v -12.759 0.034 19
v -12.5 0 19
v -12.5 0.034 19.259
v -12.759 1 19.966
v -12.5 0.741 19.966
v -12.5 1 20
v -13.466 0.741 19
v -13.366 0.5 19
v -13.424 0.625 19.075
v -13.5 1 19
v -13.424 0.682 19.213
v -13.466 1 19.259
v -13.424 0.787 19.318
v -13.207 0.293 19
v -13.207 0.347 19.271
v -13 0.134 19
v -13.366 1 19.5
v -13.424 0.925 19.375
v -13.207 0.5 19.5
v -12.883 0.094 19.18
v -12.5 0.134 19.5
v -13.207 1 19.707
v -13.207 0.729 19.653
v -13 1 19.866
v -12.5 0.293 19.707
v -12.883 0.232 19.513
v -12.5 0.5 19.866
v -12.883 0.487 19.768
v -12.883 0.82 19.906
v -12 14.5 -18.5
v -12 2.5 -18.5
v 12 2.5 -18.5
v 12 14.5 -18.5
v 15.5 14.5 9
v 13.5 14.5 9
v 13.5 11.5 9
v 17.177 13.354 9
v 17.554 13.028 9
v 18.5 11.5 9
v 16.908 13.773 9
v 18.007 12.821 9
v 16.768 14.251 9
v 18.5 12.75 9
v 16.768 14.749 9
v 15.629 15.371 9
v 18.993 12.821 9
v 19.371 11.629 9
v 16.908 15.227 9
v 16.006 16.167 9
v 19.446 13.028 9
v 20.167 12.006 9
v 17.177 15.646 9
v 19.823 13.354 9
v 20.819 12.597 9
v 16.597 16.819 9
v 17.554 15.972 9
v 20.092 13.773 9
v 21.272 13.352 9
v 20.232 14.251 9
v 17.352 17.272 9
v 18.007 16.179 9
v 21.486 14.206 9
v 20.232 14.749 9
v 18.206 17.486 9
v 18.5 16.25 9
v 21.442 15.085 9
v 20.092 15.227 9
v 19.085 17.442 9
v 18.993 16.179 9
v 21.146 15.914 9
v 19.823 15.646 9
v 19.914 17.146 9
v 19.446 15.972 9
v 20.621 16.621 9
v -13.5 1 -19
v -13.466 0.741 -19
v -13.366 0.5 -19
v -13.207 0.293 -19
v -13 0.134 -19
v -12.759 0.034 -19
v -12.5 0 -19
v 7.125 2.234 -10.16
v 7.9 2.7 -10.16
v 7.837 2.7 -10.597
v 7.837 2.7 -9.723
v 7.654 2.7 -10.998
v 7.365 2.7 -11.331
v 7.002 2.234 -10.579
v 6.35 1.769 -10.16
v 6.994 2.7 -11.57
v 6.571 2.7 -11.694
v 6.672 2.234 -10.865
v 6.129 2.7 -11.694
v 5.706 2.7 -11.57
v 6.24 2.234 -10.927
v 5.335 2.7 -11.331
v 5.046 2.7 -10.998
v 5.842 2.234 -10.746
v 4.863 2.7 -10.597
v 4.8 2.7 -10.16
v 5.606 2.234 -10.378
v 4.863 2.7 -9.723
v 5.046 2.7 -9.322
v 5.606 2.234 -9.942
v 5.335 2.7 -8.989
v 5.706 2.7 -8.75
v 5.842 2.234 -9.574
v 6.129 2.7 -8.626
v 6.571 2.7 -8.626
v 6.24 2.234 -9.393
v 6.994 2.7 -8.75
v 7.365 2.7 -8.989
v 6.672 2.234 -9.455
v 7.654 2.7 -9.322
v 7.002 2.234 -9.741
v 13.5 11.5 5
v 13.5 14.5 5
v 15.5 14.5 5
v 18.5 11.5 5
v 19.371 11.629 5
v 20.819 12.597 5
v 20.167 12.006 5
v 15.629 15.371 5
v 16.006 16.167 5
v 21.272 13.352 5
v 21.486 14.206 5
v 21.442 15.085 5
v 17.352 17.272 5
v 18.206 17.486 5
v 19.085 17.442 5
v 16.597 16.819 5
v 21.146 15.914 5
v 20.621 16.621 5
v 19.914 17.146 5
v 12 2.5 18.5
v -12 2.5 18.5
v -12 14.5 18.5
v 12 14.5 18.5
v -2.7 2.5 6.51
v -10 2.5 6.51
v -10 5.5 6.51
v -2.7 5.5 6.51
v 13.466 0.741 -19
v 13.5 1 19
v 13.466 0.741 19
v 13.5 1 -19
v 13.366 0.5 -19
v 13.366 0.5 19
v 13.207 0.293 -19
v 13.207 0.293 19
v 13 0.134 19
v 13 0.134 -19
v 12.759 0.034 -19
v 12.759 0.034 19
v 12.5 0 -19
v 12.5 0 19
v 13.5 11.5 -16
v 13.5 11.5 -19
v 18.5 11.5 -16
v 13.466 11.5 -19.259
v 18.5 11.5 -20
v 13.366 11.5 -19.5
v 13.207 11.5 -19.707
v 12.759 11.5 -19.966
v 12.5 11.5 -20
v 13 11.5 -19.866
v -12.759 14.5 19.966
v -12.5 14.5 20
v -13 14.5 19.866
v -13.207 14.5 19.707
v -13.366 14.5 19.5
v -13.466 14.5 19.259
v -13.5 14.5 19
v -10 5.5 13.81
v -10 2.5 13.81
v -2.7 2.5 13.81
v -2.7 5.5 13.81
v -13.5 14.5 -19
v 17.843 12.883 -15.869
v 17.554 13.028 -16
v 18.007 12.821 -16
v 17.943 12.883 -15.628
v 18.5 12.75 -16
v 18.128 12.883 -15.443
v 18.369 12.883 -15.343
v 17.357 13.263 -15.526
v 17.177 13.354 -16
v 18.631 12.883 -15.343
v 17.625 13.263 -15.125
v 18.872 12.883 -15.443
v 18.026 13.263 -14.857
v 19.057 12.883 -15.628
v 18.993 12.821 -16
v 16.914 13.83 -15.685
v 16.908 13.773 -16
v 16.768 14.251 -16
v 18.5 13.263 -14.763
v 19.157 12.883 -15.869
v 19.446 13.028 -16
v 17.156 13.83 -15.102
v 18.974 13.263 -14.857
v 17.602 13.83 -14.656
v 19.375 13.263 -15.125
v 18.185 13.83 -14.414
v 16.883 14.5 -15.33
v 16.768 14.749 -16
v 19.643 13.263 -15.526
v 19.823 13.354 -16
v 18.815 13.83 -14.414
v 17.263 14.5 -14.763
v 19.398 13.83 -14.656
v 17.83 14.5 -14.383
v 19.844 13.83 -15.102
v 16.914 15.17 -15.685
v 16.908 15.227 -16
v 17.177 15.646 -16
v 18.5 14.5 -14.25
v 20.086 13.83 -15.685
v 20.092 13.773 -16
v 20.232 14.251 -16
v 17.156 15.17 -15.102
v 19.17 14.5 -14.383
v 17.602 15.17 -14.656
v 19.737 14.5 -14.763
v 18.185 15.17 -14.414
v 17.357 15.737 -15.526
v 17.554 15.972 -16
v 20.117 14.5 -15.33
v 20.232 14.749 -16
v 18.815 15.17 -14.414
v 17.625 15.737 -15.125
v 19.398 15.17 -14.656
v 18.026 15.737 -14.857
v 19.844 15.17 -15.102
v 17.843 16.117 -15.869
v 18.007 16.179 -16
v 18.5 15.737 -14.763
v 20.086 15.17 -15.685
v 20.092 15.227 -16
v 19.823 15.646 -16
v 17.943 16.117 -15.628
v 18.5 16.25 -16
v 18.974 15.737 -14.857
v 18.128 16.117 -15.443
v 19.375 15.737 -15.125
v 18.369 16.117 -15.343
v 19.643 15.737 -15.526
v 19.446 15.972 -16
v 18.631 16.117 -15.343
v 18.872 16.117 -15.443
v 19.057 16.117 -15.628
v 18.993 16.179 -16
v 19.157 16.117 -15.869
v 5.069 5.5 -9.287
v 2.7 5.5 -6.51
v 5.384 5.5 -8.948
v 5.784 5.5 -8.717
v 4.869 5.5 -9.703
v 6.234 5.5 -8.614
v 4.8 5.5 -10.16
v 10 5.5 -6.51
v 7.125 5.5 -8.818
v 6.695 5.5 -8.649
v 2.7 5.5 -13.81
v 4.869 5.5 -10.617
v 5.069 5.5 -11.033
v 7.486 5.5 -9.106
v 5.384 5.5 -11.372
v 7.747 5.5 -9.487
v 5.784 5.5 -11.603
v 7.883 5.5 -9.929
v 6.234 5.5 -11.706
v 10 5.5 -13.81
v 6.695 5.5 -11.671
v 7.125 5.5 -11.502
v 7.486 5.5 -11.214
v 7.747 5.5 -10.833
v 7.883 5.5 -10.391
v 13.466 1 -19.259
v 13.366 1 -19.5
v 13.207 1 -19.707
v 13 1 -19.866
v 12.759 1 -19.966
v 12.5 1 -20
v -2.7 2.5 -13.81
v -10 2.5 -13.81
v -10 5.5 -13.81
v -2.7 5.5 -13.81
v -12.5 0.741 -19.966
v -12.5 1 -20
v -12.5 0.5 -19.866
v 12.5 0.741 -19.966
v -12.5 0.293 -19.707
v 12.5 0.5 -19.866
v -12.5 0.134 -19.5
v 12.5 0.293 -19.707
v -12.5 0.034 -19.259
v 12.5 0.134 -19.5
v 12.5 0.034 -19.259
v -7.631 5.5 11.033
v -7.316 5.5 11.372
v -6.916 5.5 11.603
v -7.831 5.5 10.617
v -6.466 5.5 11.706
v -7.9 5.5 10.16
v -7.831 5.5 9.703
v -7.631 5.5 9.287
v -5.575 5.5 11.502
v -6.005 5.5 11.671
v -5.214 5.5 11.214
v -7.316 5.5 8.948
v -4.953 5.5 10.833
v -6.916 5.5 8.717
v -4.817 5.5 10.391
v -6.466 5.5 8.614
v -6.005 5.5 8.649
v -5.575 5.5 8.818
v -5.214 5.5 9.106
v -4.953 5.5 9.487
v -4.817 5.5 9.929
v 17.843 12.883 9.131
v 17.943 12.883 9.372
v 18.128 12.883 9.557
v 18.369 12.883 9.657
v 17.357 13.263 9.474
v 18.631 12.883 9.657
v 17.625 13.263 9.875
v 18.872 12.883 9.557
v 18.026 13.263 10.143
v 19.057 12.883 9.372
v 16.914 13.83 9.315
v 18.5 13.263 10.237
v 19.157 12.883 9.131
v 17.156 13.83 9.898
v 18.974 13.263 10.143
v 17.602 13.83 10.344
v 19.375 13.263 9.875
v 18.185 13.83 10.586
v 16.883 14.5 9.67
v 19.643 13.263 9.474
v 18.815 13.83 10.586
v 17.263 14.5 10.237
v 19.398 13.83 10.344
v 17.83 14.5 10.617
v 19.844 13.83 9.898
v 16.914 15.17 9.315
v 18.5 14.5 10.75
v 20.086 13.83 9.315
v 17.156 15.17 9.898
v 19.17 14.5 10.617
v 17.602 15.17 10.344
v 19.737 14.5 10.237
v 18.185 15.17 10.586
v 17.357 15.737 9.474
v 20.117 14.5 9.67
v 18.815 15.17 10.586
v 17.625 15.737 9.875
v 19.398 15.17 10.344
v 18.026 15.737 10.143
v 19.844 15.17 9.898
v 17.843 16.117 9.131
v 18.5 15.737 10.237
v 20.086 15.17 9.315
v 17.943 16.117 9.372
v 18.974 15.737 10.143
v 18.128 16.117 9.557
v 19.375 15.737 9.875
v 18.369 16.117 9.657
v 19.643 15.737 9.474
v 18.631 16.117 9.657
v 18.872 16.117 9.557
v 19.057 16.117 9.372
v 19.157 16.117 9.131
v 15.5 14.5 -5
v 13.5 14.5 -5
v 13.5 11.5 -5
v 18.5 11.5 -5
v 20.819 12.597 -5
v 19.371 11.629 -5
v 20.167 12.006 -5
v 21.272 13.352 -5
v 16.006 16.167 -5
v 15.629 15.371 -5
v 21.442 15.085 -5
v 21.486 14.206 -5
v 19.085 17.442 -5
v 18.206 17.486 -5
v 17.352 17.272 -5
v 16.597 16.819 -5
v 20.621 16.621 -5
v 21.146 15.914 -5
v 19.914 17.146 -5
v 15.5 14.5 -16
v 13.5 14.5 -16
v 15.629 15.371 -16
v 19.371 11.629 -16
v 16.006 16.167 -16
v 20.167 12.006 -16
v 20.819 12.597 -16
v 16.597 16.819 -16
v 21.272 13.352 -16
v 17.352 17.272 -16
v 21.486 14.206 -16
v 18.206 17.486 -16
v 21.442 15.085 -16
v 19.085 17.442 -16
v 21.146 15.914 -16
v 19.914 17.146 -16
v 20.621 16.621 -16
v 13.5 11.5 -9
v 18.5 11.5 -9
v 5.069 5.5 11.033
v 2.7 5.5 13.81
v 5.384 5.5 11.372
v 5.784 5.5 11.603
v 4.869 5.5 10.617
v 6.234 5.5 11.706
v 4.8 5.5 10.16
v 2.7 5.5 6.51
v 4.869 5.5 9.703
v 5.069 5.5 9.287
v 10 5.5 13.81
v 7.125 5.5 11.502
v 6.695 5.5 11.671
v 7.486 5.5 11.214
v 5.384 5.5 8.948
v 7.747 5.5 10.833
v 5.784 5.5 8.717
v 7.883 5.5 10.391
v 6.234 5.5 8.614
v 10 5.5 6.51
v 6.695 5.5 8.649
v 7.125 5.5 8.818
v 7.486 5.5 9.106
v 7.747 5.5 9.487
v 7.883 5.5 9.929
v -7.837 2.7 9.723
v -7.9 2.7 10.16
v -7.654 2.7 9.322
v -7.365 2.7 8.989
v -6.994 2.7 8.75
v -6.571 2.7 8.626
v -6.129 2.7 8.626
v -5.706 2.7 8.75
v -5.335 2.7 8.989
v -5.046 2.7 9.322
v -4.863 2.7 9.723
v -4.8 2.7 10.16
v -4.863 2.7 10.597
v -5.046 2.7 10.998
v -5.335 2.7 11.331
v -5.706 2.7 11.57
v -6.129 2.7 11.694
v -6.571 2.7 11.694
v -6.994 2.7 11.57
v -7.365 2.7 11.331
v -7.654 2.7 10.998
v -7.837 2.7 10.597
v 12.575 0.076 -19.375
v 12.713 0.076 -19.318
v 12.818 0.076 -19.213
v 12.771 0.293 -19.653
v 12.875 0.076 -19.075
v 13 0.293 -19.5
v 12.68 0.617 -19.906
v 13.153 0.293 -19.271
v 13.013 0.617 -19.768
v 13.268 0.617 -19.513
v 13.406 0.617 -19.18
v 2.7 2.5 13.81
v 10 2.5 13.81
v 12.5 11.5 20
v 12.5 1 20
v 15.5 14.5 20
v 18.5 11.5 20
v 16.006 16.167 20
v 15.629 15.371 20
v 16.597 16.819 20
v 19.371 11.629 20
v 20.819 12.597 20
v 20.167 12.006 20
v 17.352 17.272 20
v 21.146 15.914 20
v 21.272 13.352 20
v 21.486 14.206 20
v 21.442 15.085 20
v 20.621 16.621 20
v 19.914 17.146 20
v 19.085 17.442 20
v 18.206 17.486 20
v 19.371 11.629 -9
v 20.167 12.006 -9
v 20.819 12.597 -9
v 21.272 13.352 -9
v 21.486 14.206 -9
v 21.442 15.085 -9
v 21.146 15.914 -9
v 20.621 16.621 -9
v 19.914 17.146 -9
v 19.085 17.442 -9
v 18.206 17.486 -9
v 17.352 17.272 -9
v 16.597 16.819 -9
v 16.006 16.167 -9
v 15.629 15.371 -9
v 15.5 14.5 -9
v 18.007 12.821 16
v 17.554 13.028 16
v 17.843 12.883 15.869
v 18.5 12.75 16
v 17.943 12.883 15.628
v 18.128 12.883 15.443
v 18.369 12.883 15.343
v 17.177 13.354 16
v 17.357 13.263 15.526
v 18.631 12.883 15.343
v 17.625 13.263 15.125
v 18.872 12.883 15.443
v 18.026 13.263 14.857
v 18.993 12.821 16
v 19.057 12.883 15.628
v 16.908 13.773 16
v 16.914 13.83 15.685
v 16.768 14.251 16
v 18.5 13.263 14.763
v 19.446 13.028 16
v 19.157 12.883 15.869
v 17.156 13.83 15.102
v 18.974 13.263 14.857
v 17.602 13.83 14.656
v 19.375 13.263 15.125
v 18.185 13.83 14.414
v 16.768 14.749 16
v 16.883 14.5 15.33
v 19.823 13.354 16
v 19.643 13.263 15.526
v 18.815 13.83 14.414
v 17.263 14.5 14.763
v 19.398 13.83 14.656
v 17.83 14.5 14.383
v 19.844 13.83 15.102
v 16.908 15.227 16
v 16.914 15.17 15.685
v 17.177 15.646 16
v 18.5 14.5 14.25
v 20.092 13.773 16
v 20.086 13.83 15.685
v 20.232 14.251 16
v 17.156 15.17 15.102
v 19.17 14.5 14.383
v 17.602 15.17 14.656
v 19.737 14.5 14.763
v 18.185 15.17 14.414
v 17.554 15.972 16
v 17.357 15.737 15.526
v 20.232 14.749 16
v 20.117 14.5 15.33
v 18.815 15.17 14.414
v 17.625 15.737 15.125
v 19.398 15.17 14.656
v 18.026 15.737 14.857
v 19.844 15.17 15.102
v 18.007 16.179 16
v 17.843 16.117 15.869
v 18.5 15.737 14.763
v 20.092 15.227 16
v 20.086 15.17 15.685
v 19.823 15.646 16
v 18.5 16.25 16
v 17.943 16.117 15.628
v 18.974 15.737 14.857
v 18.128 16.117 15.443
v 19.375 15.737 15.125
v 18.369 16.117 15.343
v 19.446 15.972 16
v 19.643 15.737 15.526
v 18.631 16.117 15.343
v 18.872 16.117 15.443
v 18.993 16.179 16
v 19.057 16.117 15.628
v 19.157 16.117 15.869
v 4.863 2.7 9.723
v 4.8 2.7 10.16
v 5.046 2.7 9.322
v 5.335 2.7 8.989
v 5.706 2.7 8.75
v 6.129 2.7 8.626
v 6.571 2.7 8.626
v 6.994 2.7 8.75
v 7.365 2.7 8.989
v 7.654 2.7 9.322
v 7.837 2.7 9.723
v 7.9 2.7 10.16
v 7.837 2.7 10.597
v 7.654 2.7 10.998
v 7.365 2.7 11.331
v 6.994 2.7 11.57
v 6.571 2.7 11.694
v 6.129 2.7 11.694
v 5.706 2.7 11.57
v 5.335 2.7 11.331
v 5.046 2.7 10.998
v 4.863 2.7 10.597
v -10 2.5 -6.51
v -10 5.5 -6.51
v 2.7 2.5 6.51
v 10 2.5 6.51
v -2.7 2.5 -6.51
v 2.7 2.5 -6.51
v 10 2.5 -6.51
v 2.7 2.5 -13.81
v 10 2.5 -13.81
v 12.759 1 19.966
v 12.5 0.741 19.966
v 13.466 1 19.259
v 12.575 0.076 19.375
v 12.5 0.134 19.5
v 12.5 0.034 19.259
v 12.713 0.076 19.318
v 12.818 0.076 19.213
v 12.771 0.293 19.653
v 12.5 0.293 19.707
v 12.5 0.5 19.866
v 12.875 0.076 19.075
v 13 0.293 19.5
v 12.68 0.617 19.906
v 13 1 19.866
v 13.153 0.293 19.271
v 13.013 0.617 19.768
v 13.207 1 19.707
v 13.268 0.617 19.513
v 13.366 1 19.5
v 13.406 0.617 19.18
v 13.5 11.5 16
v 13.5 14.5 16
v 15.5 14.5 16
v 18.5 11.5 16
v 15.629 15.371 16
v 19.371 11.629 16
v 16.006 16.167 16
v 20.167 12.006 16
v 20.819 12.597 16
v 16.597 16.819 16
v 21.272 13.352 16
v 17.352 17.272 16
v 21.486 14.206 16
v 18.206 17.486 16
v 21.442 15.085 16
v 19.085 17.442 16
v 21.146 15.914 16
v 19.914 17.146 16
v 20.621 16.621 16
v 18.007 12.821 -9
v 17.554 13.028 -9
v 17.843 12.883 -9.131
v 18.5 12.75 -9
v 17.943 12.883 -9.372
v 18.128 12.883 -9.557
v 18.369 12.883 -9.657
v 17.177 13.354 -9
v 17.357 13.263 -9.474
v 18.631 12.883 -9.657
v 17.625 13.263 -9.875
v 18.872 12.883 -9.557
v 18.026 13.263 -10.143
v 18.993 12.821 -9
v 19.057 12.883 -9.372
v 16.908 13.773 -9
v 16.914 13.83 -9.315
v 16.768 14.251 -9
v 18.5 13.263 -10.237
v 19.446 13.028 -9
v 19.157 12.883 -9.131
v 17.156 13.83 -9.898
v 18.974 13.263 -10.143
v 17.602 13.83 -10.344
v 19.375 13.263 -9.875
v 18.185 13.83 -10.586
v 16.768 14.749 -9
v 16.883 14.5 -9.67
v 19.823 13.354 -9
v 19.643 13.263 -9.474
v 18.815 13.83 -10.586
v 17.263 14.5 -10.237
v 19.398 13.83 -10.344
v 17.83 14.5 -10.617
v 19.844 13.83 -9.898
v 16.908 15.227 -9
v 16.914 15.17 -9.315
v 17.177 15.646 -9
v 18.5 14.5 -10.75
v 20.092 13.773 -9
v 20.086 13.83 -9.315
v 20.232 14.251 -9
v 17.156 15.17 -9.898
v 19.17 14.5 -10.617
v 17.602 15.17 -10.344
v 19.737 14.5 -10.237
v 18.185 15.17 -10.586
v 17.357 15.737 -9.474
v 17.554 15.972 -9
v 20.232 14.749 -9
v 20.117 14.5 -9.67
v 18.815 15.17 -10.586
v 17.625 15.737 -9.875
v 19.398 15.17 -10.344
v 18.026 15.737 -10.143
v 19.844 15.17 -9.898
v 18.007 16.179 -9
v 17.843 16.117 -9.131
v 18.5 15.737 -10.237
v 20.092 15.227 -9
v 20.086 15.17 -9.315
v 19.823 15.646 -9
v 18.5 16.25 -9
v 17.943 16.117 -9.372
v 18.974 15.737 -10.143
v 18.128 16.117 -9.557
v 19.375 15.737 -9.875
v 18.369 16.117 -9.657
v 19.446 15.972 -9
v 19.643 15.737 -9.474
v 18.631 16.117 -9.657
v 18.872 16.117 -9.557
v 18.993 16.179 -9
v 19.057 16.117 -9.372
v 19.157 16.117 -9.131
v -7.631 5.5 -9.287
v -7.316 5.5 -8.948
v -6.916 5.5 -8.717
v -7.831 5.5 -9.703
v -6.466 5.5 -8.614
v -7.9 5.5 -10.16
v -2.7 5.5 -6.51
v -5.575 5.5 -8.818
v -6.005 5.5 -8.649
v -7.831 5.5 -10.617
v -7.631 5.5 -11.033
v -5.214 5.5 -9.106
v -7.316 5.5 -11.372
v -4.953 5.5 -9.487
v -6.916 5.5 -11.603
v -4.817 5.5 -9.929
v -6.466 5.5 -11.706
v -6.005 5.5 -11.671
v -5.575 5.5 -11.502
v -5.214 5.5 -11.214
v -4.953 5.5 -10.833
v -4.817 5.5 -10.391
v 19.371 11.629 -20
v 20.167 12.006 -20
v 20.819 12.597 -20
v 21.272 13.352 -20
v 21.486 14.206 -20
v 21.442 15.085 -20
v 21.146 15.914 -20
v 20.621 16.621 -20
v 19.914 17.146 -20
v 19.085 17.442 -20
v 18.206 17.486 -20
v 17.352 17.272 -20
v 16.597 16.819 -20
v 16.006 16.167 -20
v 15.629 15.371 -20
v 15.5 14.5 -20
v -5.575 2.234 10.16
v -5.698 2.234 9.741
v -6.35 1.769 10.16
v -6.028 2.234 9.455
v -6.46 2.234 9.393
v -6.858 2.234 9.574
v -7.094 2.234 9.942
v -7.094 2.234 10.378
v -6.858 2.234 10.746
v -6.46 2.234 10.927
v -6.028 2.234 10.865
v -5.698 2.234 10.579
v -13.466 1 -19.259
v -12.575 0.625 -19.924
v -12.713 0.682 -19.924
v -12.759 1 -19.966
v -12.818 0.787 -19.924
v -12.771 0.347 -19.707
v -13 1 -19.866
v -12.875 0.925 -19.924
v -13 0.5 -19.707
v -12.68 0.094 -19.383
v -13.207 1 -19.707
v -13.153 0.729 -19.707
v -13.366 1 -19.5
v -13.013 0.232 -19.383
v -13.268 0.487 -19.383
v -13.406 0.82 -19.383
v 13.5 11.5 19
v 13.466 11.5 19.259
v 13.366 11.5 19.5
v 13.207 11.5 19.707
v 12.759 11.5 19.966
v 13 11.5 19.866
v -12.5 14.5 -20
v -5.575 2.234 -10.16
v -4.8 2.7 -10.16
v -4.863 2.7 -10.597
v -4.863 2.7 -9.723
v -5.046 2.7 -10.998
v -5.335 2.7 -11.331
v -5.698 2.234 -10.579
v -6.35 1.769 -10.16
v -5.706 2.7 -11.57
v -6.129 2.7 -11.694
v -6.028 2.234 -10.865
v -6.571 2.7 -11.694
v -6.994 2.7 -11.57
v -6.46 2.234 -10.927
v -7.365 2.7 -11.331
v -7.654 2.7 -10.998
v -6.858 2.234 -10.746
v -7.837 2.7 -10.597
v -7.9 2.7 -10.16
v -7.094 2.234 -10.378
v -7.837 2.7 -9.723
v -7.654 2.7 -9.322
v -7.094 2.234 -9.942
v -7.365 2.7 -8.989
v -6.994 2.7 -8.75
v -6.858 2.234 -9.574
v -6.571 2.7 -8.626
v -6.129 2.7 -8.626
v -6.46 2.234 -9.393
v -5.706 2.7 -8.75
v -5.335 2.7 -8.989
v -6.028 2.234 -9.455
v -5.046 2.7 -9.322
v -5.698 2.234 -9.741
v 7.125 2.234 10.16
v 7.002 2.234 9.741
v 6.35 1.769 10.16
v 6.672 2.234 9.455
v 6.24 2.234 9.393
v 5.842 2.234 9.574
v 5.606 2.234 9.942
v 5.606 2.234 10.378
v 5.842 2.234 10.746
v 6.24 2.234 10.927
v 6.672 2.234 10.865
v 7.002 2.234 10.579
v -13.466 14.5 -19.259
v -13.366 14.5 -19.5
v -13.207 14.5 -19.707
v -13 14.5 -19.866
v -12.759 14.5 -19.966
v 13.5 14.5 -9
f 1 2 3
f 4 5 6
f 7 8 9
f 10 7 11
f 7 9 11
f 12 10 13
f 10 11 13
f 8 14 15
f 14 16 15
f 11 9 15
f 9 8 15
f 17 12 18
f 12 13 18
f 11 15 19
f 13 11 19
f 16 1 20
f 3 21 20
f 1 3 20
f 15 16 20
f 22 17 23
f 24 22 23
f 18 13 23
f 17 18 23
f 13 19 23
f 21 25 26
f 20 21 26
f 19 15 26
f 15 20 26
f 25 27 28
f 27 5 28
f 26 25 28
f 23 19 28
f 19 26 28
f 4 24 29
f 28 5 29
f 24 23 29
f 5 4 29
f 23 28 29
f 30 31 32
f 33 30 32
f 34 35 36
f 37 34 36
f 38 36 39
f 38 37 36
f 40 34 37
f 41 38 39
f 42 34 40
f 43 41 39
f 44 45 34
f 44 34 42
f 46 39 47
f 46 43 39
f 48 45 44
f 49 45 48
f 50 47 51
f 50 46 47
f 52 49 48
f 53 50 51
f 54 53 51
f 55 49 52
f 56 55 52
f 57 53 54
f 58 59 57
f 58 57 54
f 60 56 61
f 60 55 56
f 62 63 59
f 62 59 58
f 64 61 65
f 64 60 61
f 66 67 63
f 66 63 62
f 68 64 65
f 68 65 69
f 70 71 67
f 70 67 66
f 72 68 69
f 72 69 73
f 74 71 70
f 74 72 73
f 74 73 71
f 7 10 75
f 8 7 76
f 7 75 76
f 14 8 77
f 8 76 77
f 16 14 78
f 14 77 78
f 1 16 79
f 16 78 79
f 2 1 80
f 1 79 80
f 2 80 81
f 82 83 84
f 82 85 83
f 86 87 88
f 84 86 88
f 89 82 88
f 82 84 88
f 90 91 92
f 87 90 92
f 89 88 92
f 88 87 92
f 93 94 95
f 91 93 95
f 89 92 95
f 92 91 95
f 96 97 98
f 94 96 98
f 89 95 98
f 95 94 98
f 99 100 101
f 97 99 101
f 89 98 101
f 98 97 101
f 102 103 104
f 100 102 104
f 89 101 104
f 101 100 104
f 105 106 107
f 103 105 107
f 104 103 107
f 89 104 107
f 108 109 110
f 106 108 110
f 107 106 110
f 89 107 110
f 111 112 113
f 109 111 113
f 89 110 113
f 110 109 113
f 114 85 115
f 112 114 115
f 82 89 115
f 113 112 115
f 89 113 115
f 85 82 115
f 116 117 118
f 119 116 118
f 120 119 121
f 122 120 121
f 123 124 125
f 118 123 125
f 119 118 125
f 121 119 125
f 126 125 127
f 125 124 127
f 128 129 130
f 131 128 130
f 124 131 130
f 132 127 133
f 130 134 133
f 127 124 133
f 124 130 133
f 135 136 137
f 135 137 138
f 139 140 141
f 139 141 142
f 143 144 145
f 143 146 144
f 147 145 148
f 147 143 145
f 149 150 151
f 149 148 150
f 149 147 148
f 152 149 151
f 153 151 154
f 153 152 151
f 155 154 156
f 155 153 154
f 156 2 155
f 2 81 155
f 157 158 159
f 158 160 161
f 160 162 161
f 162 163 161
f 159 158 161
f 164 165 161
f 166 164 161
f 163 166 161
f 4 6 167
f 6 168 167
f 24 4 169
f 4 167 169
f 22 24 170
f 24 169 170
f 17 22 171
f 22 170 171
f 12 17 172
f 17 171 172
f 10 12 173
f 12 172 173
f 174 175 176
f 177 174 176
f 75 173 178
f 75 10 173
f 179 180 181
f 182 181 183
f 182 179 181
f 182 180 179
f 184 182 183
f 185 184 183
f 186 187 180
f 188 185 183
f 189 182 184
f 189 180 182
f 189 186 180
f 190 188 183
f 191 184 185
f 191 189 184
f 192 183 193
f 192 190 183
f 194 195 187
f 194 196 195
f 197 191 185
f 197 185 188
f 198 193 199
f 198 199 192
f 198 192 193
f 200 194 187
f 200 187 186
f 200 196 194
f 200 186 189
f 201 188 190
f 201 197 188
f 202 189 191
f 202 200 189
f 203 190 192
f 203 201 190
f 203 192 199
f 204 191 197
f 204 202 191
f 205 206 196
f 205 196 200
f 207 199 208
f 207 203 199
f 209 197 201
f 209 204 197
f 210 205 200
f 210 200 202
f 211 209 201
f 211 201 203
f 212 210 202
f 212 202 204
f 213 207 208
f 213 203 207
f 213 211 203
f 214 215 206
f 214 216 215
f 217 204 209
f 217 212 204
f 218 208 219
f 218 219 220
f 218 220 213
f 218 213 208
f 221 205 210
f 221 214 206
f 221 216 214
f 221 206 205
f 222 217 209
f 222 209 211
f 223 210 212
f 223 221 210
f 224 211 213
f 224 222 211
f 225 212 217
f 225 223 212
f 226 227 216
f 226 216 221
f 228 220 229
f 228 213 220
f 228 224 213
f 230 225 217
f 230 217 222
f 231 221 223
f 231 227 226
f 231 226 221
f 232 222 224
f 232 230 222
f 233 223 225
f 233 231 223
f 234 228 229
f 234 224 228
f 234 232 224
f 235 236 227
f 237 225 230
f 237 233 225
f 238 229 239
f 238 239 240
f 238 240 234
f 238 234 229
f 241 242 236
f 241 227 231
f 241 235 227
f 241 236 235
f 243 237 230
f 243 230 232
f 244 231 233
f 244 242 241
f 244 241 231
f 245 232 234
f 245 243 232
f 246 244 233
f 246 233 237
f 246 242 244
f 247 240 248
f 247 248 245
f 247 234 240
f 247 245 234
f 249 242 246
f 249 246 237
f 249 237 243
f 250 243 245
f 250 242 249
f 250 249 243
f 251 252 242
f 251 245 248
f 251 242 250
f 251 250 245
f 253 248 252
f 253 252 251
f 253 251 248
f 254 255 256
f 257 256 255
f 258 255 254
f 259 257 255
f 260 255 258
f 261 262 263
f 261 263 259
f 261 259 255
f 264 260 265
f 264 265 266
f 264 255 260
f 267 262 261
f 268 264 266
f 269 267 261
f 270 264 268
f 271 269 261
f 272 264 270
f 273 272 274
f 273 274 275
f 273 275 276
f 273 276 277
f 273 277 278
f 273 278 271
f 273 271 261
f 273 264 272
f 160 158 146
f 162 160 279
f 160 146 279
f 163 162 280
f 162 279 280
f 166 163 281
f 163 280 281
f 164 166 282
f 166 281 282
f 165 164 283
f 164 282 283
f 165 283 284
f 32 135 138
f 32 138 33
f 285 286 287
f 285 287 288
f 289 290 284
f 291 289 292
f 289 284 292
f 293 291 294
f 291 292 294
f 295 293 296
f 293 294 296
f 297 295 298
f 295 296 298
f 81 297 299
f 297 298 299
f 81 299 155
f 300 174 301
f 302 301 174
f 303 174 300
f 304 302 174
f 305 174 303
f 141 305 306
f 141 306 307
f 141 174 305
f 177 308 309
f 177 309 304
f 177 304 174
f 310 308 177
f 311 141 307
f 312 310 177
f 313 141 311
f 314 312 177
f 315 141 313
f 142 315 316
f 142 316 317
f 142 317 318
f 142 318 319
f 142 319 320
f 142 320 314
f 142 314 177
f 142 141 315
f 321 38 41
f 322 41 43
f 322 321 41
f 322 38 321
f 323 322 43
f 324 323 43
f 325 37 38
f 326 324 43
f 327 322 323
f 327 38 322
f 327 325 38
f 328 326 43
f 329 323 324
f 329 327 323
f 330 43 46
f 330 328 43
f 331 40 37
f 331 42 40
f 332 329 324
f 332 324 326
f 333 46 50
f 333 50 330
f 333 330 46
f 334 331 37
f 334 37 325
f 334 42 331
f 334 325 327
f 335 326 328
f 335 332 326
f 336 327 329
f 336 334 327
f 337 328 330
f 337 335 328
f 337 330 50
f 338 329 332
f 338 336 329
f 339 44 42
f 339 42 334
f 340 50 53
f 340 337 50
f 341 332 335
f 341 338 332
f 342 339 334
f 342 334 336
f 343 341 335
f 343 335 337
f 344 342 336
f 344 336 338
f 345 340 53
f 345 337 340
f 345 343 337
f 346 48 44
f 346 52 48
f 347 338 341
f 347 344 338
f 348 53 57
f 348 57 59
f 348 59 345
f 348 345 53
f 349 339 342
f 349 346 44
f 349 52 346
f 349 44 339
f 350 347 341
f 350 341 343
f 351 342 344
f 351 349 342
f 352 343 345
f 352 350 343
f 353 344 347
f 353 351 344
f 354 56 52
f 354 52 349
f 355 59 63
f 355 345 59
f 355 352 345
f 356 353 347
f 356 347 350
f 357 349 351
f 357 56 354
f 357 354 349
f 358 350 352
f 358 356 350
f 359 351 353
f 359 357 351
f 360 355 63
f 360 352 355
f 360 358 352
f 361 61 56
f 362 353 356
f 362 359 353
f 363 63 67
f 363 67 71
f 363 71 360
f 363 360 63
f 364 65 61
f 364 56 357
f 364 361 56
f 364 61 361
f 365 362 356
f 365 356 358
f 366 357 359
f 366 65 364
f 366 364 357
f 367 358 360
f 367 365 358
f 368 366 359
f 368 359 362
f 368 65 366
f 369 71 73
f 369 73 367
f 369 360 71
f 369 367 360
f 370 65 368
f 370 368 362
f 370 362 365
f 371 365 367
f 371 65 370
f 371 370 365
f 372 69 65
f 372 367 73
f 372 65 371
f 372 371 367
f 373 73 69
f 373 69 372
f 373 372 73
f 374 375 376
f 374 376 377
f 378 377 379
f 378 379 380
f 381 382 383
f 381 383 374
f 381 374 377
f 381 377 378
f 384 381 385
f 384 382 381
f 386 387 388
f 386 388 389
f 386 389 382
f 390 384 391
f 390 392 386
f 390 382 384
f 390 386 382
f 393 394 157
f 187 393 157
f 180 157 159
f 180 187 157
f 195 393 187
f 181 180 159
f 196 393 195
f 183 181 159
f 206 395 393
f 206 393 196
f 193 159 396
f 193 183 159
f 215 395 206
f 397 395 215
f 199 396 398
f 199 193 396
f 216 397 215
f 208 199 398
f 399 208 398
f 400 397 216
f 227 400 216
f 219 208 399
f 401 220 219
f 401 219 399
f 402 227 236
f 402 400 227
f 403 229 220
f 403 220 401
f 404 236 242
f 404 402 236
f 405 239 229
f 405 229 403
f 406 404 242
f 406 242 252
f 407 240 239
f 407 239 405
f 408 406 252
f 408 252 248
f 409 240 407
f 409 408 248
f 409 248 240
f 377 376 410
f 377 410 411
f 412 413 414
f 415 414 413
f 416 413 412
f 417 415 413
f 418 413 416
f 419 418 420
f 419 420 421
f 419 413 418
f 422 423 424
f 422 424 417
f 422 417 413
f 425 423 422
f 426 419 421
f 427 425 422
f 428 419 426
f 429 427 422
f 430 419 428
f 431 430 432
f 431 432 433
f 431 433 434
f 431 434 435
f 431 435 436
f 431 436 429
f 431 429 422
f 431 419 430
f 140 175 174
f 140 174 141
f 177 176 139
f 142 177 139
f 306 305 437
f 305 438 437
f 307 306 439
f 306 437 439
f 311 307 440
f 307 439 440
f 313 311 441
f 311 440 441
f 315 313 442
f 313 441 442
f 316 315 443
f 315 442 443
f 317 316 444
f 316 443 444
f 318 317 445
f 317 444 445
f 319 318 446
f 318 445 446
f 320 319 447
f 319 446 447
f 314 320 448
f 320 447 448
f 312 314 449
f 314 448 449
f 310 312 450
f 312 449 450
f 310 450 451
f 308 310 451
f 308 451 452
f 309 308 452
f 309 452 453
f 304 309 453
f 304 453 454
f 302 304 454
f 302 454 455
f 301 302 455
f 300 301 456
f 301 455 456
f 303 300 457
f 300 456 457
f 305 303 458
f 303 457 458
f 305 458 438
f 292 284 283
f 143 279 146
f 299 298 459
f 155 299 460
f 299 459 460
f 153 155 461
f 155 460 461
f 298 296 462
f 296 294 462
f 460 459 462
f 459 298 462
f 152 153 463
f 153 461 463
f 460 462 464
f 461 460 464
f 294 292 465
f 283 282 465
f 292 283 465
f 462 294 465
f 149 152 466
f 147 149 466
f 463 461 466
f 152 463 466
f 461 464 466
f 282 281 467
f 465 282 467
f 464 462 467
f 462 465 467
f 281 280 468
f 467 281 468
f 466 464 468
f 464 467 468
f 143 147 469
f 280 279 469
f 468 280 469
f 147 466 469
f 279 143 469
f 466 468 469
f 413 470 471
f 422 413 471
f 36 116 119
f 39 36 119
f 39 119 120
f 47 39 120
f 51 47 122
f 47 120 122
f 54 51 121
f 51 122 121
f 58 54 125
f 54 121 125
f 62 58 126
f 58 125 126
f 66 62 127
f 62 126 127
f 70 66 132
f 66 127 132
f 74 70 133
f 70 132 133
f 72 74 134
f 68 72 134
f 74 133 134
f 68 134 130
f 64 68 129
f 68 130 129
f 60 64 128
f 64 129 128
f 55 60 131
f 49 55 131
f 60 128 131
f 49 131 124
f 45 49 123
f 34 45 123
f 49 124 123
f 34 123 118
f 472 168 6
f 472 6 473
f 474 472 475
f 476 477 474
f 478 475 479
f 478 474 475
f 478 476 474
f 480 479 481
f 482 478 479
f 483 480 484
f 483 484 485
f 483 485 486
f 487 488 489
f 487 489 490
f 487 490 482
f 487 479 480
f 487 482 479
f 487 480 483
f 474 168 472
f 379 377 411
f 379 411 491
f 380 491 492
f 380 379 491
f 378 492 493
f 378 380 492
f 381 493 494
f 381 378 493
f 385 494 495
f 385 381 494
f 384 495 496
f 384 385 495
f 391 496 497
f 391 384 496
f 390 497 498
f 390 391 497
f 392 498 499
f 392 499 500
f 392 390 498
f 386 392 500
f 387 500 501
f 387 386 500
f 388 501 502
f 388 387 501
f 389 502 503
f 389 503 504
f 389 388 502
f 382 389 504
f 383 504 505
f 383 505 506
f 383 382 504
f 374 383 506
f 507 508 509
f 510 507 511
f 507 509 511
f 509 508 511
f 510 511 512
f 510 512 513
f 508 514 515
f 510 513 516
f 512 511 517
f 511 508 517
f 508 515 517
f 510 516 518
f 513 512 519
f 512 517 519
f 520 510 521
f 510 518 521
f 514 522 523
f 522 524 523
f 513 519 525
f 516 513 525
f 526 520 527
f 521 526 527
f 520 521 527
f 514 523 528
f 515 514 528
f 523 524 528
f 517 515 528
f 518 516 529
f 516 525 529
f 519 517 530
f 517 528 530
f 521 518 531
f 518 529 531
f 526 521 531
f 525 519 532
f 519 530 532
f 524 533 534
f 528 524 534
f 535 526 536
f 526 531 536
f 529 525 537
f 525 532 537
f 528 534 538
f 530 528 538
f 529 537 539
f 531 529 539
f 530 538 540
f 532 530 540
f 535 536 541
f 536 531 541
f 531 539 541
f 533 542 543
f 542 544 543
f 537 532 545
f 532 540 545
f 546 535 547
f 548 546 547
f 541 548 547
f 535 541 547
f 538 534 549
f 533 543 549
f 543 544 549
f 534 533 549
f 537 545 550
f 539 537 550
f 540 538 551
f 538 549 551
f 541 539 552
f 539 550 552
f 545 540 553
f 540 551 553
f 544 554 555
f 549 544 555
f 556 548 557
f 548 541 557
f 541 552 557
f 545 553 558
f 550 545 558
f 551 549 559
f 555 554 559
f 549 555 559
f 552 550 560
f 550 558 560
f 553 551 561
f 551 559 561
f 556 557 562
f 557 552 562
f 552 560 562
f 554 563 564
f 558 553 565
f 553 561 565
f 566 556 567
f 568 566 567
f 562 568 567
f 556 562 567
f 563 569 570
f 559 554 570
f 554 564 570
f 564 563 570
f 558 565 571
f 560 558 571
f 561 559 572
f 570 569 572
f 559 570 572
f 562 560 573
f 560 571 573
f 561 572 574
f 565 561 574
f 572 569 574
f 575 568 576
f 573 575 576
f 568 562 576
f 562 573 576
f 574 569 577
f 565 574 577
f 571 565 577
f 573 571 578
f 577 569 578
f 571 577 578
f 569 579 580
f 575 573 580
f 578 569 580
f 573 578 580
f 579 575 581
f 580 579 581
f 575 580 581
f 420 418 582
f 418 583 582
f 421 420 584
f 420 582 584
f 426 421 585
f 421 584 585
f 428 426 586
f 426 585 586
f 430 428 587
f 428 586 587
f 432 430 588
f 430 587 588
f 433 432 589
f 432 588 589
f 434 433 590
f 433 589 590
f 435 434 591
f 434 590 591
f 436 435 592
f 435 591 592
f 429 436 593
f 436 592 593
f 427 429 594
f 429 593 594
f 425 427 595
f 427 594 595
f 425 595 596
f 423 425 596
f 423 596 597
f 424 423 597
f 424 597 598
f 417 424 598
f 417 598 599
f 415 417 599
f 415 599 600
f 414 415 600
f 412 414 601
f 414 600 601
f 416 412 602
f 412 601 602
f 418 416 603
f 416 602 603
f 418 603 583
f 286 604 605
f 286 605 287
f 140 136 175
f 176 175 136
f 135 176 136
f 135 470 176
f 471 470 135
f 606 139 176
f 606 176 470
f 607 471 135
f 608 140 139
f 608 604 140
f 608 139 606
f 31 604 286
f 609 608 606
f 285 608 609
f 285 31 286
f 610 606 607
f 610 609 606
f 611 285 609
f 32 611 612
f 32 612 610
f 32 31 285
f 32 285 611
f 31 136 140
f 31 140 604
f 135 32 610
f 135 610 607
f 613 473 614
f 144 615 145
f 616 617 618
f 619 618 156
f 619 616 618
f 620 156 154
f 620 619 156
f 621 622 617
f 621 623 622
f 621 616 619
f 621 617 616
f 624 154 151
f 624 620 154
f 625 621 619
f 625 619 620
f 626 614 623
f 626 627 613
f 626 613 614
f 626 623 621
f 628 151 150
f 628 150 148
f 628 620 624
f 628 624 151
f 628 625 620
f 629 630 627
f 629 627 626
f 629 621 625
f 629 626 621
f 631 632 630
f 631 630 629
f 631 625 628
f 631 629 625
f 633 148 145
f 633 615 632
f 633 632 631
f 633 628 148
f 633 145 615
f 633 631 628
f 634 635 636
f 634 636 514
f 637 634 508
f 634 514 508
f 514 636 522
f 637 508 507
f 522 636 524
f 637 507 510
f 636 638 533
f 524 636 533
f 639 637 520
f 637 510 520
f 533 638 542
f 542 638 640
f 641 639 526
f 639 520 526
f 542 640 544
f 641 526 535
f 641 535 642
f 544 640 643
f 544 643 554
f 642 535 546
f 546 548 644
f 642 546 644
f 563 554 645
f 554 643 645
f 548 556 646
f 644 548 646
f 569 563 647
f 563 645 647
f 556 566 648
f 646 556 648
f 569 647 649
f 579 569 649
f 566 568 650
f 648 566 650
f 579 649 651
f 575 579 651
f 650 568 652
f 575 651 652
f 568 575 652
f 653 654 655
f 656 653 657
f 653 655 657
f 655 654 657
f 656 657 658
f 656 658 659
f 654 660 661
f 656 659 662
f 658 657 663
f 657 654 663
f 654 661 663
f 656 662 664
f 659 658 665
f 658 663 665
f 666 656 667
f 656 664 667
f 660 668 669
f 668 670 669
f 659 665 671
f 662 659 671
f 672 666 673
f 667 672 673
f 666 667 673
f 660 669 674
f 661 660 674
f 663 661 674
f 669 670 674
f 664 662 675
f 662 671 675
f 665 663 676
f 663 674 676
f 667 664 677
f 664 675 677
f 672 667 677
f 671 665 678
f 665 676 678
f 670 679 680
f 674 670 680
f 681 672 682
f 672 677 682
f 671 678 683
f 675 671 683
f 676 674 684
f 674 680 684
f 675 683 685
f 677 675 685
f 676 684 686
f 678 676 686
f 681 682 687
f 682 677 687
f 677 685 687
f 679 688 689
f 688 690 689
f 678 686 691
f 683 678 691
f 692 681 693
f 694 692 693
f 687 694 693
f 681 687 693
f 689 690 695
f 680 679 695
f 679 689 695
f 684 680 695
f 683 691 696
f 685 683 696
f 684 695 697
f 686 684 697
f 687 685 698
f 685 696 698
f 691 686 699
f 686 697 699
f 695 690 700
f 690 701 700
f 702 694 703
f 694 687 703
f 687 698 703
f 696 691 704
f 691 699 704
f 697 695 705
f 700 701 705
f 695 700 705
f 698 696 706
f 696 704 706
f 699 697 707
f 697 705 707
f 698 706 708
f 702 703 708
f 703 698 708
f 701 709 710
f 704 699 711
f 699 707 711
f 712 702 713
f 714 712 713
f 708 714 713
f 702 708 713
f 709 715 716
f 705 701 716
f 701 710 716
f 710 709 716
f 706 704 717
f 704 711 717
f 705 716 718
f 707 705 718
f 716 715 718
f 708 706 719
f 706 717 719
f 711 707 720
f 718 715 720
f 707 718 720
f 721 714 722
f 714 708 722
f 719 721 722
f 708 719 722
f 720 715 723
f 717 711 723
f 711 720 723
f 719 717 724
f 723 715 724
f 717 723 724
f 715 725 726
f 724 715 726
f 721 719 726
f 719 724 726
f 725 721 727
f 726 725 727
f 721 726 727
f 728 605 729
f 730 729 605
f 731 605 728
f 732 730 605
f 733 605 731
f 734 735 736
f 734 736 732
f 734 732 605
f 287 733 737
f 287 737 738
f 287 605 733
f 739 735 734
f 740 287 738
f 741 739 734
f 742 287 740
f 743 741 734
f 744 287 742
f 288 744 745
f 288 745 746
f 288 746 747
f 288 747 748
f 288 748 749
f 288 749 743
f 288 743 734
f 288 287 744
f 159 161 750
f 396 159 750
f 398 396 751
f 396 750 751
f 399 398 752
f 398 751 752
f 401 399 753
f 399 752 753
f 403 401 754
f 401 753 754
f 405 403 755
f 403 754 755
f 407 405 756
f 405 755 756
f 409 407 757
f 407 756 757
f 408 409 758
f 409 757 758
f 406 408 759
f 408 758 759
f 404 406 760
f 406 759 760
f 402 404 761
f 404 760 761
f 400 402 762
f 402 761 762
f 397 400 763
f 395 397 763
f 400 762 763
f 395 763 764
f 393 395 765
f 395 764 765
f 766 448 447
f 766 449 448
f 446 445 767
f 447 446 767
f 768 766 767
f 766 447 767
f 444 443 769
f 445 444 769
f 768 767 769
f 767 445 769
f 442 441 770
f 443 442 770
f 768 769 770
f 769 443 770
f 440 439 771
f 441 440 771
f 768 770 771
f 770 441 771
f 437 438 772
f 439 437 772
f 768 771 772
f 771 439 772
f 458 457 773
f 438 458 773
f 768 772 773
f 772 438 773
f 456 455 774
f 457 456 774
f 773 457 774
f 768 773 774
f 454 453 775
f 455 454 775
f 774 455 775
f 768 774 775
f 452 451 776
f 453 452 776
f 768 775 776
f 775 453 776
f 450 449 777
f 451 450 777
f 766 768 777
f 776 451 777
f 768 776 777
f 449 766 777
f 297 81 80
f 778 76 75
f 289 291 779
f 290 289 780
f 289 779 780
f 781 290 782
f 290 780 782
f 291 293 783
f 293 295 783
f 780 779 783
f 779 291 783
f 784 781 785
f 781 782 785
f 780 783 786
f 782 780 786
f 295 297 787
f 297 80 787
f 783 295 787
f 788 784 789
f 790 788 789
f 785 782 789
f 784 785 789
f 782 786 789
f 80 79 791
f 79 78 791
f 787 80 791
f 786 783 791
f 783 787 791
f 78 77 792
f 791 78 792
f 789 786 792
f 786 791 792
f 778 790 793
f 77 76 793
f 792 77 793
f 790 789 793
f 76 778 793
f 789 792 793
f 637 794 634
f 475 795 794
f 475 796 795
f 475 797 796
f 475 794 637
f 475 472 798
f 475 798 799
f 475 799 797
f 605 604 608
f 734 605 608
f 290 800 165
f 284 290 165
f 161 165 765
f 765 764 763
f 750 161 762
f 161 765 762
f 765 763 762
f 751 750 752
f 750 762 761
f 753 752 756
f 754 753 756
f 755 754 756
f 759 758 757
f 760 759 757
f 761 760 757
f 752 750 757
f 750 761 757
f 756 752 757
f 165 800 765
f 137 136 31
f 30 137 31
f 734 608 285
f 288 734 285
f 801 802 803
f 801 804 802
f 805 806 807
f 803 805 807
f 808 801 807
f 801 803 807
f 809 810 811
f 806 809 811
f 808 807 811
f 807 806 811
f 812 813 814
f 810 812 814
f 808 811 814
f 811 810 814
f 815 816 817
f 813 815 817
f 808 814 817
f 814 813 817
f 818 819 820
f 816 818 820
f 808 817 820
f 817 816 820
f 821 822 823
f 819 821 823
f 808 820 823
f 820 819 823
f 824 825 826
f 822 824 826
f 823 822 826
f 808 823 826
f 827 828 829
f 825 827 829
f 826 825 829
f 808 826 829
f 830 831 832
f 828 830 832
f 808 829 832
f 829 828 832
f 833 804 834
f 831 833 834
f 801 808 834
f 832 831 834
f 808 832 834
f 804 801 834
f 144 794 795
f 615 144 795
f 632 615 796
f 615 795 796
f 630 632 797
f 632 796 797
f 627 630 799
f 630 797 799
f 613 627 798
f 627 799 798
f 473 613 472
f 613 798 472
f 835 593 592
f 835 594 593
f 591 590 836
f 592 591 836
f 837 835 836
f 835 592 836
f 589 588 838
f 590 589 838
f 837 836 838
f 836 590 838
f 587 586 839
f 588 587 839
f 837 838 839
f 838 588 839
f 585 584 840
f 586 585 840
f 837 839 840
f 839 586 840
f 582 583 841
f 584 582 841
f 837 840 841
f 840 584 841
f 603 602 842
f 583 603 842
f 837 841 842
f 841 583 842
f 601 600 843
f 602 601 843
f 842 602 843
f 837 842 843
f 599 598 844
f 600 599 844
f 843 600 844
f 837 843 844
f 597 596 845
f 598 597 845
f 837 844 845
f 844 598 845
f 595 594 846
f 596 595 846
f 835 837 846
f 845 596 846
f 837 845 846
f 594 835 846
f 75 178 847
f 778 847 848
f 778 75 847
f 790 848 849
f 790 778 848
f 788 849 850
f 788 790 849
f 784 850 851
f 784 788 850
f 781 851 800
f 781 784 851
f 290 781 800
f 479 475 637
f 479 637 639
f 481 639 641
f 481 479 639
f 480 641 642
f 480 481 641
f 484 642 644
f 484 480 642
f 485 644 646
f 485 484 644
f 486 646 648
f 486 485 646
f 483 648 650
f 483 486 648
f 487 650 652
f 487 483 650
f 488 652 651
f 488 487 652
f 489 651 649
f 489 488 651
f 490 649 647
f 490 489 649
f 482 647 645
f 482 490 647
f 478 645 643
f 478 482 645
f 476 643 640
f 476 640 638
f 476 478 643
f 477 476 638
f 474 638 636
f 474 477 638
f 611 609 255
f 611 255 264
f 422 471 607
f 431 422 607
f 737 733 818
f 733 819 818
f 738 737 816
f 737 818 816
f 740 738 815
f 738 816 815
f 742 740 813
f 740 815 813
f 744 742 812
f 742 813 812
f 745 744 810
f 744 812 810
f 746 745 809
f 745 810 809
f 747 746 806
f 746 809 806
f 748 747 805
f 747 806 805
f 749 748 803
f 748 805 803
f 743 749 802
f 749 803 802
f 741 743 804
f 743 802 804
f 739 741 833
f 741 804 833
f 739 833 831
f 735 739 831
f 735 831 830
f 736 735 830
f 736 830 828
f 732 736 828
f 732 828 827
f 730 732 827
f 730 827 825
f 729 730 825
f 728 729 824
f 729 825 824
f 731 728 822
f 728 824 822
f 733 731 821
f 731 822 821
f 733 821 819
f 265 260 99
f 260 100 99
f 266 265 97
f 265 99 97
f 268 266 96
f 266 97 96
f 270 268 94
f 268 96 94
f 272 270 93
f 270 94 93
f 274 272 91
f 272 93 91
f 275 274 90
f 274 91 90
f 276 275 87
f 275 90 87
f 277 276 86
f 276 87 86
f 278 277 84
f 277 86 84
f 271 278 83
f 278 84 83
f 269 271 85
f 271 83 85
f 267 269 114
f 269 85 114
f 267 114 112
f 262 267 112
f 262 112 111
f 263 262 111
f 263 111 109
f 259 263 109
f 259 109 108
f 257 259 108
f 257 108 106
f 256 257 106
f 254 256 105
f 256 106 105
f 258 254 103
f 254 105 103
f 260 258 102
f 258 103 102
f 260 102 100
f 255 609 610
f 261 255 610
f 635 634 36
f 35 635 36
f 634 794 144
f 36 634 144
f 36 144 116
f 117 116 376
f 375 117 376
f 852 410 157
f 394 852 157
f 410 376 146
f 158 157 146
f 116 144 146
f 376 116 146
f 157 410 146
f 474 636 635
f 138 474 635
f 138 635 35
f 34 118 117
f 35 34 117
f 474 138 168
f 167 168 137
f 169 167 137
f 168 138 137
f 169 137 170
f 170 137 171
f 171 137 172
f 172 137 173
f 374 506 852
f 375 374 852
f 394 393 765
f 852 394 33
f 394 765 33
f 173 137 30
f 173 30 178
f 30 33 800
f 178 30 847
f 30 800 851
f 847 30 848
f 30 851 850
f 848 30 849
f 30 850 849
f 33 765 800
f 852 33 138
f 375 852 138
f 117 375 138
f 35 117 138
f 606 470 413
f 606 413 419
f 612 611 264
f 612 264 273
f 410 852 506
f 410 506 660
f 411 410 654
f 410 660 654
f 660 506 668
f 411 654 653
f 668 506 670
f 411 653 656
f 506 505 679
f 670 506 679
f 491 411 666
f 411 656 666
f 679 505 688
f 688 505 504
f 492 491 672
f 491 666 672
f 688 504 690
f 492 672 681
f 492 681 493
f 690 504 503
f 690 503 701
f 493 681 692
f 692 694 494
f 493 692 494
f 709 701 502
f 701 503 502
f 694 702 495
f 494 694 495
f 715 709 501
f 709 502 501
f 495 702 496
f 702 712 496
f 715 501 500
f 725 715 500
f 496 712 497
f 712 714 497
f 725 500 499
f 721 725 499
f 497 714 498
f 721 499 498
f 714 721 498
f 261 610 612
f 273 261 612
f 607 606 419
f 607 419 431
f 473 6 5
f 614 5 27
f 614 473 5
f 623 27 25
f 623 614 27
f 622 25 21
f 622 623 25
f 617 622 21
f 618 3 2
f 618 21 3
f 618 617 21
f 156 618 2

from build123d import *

# Parameters (mm, degrees)
SKETCH2_W                 = 27
SKETCH2_H                 = 40
BOSS_EXTRUDE1_DEPTH       = 2.5
SKETCH3_W                 = 27
SKETCH3_H                 = 40
SKETCH3_W_2               = 24
SKETCH3_H_2               = 37
BOSS_EXTRUDE2_DEPTH       = 12
BOSS_EXTRUDE3_DEPTH       = 4
SKETCH5_W                 = 7.3
SKETCH5_H                 = 7.3
BOSS_EXTRUDE4_DEPTH       = 3
F_3_0MM_DOWEL_HOLE1_D     = 3.1
F_3_0MM_DOWEL_HOLE1_DEPTH = 2.8
F_3_0MM_DOWEL_HOLE1_TIP   = 0.931333959
REVOLVE1_ANGLE            = 180
MIRROR2_COPY_1_DEPTH      = 4
MIRROR2_COPY_2_ANGLE      = 180
FILLET1_R                 = 1


with BuildPart() as part:
    # Sketch2 → Boss-Extrude1 (new body)
    with BuildSketch(Plane(origin=(0, 0, 0), x_dir=(1, 0, 0), z_dir=(0, 1, 0))):
        Rectangle(SKETCH2_W, SKETCH2_H)
    extrude(amount=BOSS_EXTRUDE1_DEPTH)

    # Sketch3 → Boss-Extrude2 (add)
    with BuildSketch(Plane(origin=(0, 2.5, 0), x_dir=(1, 0, 0), z_dir=(0, 1, 0))):
        Rectangle(SKETCH3_W, SKETCH3_H)
        Rectangle(SKETCH3_W_2, SKETCH3_H_2, mode=Mode.SUBTRACT)
    extrude(amount=BOSS_EXTRUDE2_DEPTH)

    # Sketch4 → Boss-Extrude3 (add)
    with BuildSketch(Plane.XY.offset(20)):
        with BuildLine():
            Line((15.5, 14.5), (13.5, 14.5))
            Line((13.5, 14.5), (13.5, 11.5))
            Line((13.5, 11.5), (18.5, 11.5))
            ThreePointArc((18.5, 11.5), (20.621320344, 16.621320344), (15.5, 14.5))
        make_face()
    boss_extrude3 = extrude(amount=-BOSS_EXTRUDE3_DEPTH)

    # Sketch5 → Boss-Extrude4 (add)
    with BuildSketch(Plane(origin=(0, 2.5, 0), x_dir=(1, 0, 0), z_dir=(0, 1, 0))):
        with Locations((-6.35, 10.16)):
            Rectangle(SKETCH5_W, SKETCH5_H)
        with Locations((6.35, 10.16)):
            Rectangle(SKETCH5_W, SKETCH5_H)
        with Locations((6.35, -10.16)):
            Rectangle(SKETCH5_W, SKETCH5_H)
        with Locations((-6.35, -10.16)):
            Rectangle(SKETCH5_W, SKETCH5_H)
    extrude(amount=BOSS_EXTRUDE4_DEPTH)

    # Ø3.0mm Dowel Hole1
    with Locations(Plane(origin=(0, 5.5, 0), x_dir=(1, 0, 0), z_dir=(0, 1, 0))):
        with Locations((-6.35, 10.16), (6.35, 10.16), (6.35, -10.16), (-6.35, -10.16)):
            Hole(F_3_0MM_DOWEL_HOLE1_D / 2, depth=F_3_0MM_DOWEL_HOLE1_DEPTH)
            with Locations((0, 0, -(F_3_0MM_DOWEL_HOLE1_DEPTH + F_3_0MM_DOWEL_HOLE1_TIP / 2))):  # 118° drill point
                Cone(0, F_3_0MM_DOWEL_HOLE1_D / 2, F_3_0MM_DOWEL_HOLE1_TIP, mode=Mode.SUBTRACT)

    # Sketch13 → Revolve1 (revolve)
    with BuildSketch(Plane(origin=(0, 0, 16), x_dir=(-1, 0, 0), z_dir=(0, 0, -1))):
        with BuildLine():
            Line((-18.5, 16.25), (-18.5, 12.75))
            ThreePointArc((-18.5, 12.75), (-16.75, 14.5), (-18.5, 16.25))
        make_face()
    revolve1 = revolve(axis=Axis((18.5, 11.5, 16), (0, -1, 0)), revolution_arc=REVOLVE1_ANGLE)

    # Mirror1: Boss-Extrude3, Revolve1 across plane
    add(boss_extrude3.mirror(Plane(origin=(0, 0, 12.5), x_dir=(1, 0, 0), z_dir=(0, 0, -1))))
    add(revolve1.mirror(Plane(origin=(0, 0, 12.5), x_dir=(1, 0, 0), z_dir=(0, 0, -1))))

    # Mirror2: Boss-Extrude3, Revolve1 across plane
    add(boss_extrude3.mirror(Plane(origin=(0, 0, 0), x_dir=(1, 0, 0), z_dir=(0, 0, -1))))
    add(revolve1.mirror(Plane(origin=(0, 0, 0), x_dir=(1, 0, 0), z_dir=(0, 0, -1))))

    # Mirror2 copy 1 sketch → Mirror2 copy 1 (add)
    with BuildSketch(Plane.XY.offset(-5)):
        with BuildLine():
            Line((15.5, 14.5), (13.5, 14.5))
            Line((13.5, 14.5), (13.5, 11.5))
            Line((13.5, 11.5), (18.5, 11.5))
            ThreePointArc((18.5, 11.5), (20.621320344, 16.621320344), (15.5, 14.5))
        make_face()
    extrude(amount=-MIRROR2_COPY_1_DEPTH)

    # Mirror2 copy 2 sketch → Mirror2 copy 2 (revolve)
    with BuildSketch(Plane(origin=(0, 0, -9), x_dir=(-1, 0, 0), z_dir=(0, 0, -1))):
        with BuildLine():
            Line((-18.5, 16.25), (-18.5, 12.75))
            ThreePointArc((-18.5, 12.75), (-16.75, 14.5), (-18.5, 16.25))
        make_face()
    revolve(axis=Axis((18.5, 11.5, -9), (0, -1, 0)), revolution_arc=MIRROR2_COPY_2_ANGLE)

    # Fillet1
    fillet1_edges = [part.edges().sort_by_distance(p)[0] for p in [
        (13.5, 5.75, -20),
        (13.5, 5.75, 20),
        (0, 0, 20),
        (-13.5, 0, 0),
        (0, 0, -20),
        (13.5, 0, 0),
        (-13.5, 7.25, 20),
        (-13.5, 7.25, -20),
    ]]
    fillet(fillet1_edges, radius=FILLET1_R)


solid = part.part
